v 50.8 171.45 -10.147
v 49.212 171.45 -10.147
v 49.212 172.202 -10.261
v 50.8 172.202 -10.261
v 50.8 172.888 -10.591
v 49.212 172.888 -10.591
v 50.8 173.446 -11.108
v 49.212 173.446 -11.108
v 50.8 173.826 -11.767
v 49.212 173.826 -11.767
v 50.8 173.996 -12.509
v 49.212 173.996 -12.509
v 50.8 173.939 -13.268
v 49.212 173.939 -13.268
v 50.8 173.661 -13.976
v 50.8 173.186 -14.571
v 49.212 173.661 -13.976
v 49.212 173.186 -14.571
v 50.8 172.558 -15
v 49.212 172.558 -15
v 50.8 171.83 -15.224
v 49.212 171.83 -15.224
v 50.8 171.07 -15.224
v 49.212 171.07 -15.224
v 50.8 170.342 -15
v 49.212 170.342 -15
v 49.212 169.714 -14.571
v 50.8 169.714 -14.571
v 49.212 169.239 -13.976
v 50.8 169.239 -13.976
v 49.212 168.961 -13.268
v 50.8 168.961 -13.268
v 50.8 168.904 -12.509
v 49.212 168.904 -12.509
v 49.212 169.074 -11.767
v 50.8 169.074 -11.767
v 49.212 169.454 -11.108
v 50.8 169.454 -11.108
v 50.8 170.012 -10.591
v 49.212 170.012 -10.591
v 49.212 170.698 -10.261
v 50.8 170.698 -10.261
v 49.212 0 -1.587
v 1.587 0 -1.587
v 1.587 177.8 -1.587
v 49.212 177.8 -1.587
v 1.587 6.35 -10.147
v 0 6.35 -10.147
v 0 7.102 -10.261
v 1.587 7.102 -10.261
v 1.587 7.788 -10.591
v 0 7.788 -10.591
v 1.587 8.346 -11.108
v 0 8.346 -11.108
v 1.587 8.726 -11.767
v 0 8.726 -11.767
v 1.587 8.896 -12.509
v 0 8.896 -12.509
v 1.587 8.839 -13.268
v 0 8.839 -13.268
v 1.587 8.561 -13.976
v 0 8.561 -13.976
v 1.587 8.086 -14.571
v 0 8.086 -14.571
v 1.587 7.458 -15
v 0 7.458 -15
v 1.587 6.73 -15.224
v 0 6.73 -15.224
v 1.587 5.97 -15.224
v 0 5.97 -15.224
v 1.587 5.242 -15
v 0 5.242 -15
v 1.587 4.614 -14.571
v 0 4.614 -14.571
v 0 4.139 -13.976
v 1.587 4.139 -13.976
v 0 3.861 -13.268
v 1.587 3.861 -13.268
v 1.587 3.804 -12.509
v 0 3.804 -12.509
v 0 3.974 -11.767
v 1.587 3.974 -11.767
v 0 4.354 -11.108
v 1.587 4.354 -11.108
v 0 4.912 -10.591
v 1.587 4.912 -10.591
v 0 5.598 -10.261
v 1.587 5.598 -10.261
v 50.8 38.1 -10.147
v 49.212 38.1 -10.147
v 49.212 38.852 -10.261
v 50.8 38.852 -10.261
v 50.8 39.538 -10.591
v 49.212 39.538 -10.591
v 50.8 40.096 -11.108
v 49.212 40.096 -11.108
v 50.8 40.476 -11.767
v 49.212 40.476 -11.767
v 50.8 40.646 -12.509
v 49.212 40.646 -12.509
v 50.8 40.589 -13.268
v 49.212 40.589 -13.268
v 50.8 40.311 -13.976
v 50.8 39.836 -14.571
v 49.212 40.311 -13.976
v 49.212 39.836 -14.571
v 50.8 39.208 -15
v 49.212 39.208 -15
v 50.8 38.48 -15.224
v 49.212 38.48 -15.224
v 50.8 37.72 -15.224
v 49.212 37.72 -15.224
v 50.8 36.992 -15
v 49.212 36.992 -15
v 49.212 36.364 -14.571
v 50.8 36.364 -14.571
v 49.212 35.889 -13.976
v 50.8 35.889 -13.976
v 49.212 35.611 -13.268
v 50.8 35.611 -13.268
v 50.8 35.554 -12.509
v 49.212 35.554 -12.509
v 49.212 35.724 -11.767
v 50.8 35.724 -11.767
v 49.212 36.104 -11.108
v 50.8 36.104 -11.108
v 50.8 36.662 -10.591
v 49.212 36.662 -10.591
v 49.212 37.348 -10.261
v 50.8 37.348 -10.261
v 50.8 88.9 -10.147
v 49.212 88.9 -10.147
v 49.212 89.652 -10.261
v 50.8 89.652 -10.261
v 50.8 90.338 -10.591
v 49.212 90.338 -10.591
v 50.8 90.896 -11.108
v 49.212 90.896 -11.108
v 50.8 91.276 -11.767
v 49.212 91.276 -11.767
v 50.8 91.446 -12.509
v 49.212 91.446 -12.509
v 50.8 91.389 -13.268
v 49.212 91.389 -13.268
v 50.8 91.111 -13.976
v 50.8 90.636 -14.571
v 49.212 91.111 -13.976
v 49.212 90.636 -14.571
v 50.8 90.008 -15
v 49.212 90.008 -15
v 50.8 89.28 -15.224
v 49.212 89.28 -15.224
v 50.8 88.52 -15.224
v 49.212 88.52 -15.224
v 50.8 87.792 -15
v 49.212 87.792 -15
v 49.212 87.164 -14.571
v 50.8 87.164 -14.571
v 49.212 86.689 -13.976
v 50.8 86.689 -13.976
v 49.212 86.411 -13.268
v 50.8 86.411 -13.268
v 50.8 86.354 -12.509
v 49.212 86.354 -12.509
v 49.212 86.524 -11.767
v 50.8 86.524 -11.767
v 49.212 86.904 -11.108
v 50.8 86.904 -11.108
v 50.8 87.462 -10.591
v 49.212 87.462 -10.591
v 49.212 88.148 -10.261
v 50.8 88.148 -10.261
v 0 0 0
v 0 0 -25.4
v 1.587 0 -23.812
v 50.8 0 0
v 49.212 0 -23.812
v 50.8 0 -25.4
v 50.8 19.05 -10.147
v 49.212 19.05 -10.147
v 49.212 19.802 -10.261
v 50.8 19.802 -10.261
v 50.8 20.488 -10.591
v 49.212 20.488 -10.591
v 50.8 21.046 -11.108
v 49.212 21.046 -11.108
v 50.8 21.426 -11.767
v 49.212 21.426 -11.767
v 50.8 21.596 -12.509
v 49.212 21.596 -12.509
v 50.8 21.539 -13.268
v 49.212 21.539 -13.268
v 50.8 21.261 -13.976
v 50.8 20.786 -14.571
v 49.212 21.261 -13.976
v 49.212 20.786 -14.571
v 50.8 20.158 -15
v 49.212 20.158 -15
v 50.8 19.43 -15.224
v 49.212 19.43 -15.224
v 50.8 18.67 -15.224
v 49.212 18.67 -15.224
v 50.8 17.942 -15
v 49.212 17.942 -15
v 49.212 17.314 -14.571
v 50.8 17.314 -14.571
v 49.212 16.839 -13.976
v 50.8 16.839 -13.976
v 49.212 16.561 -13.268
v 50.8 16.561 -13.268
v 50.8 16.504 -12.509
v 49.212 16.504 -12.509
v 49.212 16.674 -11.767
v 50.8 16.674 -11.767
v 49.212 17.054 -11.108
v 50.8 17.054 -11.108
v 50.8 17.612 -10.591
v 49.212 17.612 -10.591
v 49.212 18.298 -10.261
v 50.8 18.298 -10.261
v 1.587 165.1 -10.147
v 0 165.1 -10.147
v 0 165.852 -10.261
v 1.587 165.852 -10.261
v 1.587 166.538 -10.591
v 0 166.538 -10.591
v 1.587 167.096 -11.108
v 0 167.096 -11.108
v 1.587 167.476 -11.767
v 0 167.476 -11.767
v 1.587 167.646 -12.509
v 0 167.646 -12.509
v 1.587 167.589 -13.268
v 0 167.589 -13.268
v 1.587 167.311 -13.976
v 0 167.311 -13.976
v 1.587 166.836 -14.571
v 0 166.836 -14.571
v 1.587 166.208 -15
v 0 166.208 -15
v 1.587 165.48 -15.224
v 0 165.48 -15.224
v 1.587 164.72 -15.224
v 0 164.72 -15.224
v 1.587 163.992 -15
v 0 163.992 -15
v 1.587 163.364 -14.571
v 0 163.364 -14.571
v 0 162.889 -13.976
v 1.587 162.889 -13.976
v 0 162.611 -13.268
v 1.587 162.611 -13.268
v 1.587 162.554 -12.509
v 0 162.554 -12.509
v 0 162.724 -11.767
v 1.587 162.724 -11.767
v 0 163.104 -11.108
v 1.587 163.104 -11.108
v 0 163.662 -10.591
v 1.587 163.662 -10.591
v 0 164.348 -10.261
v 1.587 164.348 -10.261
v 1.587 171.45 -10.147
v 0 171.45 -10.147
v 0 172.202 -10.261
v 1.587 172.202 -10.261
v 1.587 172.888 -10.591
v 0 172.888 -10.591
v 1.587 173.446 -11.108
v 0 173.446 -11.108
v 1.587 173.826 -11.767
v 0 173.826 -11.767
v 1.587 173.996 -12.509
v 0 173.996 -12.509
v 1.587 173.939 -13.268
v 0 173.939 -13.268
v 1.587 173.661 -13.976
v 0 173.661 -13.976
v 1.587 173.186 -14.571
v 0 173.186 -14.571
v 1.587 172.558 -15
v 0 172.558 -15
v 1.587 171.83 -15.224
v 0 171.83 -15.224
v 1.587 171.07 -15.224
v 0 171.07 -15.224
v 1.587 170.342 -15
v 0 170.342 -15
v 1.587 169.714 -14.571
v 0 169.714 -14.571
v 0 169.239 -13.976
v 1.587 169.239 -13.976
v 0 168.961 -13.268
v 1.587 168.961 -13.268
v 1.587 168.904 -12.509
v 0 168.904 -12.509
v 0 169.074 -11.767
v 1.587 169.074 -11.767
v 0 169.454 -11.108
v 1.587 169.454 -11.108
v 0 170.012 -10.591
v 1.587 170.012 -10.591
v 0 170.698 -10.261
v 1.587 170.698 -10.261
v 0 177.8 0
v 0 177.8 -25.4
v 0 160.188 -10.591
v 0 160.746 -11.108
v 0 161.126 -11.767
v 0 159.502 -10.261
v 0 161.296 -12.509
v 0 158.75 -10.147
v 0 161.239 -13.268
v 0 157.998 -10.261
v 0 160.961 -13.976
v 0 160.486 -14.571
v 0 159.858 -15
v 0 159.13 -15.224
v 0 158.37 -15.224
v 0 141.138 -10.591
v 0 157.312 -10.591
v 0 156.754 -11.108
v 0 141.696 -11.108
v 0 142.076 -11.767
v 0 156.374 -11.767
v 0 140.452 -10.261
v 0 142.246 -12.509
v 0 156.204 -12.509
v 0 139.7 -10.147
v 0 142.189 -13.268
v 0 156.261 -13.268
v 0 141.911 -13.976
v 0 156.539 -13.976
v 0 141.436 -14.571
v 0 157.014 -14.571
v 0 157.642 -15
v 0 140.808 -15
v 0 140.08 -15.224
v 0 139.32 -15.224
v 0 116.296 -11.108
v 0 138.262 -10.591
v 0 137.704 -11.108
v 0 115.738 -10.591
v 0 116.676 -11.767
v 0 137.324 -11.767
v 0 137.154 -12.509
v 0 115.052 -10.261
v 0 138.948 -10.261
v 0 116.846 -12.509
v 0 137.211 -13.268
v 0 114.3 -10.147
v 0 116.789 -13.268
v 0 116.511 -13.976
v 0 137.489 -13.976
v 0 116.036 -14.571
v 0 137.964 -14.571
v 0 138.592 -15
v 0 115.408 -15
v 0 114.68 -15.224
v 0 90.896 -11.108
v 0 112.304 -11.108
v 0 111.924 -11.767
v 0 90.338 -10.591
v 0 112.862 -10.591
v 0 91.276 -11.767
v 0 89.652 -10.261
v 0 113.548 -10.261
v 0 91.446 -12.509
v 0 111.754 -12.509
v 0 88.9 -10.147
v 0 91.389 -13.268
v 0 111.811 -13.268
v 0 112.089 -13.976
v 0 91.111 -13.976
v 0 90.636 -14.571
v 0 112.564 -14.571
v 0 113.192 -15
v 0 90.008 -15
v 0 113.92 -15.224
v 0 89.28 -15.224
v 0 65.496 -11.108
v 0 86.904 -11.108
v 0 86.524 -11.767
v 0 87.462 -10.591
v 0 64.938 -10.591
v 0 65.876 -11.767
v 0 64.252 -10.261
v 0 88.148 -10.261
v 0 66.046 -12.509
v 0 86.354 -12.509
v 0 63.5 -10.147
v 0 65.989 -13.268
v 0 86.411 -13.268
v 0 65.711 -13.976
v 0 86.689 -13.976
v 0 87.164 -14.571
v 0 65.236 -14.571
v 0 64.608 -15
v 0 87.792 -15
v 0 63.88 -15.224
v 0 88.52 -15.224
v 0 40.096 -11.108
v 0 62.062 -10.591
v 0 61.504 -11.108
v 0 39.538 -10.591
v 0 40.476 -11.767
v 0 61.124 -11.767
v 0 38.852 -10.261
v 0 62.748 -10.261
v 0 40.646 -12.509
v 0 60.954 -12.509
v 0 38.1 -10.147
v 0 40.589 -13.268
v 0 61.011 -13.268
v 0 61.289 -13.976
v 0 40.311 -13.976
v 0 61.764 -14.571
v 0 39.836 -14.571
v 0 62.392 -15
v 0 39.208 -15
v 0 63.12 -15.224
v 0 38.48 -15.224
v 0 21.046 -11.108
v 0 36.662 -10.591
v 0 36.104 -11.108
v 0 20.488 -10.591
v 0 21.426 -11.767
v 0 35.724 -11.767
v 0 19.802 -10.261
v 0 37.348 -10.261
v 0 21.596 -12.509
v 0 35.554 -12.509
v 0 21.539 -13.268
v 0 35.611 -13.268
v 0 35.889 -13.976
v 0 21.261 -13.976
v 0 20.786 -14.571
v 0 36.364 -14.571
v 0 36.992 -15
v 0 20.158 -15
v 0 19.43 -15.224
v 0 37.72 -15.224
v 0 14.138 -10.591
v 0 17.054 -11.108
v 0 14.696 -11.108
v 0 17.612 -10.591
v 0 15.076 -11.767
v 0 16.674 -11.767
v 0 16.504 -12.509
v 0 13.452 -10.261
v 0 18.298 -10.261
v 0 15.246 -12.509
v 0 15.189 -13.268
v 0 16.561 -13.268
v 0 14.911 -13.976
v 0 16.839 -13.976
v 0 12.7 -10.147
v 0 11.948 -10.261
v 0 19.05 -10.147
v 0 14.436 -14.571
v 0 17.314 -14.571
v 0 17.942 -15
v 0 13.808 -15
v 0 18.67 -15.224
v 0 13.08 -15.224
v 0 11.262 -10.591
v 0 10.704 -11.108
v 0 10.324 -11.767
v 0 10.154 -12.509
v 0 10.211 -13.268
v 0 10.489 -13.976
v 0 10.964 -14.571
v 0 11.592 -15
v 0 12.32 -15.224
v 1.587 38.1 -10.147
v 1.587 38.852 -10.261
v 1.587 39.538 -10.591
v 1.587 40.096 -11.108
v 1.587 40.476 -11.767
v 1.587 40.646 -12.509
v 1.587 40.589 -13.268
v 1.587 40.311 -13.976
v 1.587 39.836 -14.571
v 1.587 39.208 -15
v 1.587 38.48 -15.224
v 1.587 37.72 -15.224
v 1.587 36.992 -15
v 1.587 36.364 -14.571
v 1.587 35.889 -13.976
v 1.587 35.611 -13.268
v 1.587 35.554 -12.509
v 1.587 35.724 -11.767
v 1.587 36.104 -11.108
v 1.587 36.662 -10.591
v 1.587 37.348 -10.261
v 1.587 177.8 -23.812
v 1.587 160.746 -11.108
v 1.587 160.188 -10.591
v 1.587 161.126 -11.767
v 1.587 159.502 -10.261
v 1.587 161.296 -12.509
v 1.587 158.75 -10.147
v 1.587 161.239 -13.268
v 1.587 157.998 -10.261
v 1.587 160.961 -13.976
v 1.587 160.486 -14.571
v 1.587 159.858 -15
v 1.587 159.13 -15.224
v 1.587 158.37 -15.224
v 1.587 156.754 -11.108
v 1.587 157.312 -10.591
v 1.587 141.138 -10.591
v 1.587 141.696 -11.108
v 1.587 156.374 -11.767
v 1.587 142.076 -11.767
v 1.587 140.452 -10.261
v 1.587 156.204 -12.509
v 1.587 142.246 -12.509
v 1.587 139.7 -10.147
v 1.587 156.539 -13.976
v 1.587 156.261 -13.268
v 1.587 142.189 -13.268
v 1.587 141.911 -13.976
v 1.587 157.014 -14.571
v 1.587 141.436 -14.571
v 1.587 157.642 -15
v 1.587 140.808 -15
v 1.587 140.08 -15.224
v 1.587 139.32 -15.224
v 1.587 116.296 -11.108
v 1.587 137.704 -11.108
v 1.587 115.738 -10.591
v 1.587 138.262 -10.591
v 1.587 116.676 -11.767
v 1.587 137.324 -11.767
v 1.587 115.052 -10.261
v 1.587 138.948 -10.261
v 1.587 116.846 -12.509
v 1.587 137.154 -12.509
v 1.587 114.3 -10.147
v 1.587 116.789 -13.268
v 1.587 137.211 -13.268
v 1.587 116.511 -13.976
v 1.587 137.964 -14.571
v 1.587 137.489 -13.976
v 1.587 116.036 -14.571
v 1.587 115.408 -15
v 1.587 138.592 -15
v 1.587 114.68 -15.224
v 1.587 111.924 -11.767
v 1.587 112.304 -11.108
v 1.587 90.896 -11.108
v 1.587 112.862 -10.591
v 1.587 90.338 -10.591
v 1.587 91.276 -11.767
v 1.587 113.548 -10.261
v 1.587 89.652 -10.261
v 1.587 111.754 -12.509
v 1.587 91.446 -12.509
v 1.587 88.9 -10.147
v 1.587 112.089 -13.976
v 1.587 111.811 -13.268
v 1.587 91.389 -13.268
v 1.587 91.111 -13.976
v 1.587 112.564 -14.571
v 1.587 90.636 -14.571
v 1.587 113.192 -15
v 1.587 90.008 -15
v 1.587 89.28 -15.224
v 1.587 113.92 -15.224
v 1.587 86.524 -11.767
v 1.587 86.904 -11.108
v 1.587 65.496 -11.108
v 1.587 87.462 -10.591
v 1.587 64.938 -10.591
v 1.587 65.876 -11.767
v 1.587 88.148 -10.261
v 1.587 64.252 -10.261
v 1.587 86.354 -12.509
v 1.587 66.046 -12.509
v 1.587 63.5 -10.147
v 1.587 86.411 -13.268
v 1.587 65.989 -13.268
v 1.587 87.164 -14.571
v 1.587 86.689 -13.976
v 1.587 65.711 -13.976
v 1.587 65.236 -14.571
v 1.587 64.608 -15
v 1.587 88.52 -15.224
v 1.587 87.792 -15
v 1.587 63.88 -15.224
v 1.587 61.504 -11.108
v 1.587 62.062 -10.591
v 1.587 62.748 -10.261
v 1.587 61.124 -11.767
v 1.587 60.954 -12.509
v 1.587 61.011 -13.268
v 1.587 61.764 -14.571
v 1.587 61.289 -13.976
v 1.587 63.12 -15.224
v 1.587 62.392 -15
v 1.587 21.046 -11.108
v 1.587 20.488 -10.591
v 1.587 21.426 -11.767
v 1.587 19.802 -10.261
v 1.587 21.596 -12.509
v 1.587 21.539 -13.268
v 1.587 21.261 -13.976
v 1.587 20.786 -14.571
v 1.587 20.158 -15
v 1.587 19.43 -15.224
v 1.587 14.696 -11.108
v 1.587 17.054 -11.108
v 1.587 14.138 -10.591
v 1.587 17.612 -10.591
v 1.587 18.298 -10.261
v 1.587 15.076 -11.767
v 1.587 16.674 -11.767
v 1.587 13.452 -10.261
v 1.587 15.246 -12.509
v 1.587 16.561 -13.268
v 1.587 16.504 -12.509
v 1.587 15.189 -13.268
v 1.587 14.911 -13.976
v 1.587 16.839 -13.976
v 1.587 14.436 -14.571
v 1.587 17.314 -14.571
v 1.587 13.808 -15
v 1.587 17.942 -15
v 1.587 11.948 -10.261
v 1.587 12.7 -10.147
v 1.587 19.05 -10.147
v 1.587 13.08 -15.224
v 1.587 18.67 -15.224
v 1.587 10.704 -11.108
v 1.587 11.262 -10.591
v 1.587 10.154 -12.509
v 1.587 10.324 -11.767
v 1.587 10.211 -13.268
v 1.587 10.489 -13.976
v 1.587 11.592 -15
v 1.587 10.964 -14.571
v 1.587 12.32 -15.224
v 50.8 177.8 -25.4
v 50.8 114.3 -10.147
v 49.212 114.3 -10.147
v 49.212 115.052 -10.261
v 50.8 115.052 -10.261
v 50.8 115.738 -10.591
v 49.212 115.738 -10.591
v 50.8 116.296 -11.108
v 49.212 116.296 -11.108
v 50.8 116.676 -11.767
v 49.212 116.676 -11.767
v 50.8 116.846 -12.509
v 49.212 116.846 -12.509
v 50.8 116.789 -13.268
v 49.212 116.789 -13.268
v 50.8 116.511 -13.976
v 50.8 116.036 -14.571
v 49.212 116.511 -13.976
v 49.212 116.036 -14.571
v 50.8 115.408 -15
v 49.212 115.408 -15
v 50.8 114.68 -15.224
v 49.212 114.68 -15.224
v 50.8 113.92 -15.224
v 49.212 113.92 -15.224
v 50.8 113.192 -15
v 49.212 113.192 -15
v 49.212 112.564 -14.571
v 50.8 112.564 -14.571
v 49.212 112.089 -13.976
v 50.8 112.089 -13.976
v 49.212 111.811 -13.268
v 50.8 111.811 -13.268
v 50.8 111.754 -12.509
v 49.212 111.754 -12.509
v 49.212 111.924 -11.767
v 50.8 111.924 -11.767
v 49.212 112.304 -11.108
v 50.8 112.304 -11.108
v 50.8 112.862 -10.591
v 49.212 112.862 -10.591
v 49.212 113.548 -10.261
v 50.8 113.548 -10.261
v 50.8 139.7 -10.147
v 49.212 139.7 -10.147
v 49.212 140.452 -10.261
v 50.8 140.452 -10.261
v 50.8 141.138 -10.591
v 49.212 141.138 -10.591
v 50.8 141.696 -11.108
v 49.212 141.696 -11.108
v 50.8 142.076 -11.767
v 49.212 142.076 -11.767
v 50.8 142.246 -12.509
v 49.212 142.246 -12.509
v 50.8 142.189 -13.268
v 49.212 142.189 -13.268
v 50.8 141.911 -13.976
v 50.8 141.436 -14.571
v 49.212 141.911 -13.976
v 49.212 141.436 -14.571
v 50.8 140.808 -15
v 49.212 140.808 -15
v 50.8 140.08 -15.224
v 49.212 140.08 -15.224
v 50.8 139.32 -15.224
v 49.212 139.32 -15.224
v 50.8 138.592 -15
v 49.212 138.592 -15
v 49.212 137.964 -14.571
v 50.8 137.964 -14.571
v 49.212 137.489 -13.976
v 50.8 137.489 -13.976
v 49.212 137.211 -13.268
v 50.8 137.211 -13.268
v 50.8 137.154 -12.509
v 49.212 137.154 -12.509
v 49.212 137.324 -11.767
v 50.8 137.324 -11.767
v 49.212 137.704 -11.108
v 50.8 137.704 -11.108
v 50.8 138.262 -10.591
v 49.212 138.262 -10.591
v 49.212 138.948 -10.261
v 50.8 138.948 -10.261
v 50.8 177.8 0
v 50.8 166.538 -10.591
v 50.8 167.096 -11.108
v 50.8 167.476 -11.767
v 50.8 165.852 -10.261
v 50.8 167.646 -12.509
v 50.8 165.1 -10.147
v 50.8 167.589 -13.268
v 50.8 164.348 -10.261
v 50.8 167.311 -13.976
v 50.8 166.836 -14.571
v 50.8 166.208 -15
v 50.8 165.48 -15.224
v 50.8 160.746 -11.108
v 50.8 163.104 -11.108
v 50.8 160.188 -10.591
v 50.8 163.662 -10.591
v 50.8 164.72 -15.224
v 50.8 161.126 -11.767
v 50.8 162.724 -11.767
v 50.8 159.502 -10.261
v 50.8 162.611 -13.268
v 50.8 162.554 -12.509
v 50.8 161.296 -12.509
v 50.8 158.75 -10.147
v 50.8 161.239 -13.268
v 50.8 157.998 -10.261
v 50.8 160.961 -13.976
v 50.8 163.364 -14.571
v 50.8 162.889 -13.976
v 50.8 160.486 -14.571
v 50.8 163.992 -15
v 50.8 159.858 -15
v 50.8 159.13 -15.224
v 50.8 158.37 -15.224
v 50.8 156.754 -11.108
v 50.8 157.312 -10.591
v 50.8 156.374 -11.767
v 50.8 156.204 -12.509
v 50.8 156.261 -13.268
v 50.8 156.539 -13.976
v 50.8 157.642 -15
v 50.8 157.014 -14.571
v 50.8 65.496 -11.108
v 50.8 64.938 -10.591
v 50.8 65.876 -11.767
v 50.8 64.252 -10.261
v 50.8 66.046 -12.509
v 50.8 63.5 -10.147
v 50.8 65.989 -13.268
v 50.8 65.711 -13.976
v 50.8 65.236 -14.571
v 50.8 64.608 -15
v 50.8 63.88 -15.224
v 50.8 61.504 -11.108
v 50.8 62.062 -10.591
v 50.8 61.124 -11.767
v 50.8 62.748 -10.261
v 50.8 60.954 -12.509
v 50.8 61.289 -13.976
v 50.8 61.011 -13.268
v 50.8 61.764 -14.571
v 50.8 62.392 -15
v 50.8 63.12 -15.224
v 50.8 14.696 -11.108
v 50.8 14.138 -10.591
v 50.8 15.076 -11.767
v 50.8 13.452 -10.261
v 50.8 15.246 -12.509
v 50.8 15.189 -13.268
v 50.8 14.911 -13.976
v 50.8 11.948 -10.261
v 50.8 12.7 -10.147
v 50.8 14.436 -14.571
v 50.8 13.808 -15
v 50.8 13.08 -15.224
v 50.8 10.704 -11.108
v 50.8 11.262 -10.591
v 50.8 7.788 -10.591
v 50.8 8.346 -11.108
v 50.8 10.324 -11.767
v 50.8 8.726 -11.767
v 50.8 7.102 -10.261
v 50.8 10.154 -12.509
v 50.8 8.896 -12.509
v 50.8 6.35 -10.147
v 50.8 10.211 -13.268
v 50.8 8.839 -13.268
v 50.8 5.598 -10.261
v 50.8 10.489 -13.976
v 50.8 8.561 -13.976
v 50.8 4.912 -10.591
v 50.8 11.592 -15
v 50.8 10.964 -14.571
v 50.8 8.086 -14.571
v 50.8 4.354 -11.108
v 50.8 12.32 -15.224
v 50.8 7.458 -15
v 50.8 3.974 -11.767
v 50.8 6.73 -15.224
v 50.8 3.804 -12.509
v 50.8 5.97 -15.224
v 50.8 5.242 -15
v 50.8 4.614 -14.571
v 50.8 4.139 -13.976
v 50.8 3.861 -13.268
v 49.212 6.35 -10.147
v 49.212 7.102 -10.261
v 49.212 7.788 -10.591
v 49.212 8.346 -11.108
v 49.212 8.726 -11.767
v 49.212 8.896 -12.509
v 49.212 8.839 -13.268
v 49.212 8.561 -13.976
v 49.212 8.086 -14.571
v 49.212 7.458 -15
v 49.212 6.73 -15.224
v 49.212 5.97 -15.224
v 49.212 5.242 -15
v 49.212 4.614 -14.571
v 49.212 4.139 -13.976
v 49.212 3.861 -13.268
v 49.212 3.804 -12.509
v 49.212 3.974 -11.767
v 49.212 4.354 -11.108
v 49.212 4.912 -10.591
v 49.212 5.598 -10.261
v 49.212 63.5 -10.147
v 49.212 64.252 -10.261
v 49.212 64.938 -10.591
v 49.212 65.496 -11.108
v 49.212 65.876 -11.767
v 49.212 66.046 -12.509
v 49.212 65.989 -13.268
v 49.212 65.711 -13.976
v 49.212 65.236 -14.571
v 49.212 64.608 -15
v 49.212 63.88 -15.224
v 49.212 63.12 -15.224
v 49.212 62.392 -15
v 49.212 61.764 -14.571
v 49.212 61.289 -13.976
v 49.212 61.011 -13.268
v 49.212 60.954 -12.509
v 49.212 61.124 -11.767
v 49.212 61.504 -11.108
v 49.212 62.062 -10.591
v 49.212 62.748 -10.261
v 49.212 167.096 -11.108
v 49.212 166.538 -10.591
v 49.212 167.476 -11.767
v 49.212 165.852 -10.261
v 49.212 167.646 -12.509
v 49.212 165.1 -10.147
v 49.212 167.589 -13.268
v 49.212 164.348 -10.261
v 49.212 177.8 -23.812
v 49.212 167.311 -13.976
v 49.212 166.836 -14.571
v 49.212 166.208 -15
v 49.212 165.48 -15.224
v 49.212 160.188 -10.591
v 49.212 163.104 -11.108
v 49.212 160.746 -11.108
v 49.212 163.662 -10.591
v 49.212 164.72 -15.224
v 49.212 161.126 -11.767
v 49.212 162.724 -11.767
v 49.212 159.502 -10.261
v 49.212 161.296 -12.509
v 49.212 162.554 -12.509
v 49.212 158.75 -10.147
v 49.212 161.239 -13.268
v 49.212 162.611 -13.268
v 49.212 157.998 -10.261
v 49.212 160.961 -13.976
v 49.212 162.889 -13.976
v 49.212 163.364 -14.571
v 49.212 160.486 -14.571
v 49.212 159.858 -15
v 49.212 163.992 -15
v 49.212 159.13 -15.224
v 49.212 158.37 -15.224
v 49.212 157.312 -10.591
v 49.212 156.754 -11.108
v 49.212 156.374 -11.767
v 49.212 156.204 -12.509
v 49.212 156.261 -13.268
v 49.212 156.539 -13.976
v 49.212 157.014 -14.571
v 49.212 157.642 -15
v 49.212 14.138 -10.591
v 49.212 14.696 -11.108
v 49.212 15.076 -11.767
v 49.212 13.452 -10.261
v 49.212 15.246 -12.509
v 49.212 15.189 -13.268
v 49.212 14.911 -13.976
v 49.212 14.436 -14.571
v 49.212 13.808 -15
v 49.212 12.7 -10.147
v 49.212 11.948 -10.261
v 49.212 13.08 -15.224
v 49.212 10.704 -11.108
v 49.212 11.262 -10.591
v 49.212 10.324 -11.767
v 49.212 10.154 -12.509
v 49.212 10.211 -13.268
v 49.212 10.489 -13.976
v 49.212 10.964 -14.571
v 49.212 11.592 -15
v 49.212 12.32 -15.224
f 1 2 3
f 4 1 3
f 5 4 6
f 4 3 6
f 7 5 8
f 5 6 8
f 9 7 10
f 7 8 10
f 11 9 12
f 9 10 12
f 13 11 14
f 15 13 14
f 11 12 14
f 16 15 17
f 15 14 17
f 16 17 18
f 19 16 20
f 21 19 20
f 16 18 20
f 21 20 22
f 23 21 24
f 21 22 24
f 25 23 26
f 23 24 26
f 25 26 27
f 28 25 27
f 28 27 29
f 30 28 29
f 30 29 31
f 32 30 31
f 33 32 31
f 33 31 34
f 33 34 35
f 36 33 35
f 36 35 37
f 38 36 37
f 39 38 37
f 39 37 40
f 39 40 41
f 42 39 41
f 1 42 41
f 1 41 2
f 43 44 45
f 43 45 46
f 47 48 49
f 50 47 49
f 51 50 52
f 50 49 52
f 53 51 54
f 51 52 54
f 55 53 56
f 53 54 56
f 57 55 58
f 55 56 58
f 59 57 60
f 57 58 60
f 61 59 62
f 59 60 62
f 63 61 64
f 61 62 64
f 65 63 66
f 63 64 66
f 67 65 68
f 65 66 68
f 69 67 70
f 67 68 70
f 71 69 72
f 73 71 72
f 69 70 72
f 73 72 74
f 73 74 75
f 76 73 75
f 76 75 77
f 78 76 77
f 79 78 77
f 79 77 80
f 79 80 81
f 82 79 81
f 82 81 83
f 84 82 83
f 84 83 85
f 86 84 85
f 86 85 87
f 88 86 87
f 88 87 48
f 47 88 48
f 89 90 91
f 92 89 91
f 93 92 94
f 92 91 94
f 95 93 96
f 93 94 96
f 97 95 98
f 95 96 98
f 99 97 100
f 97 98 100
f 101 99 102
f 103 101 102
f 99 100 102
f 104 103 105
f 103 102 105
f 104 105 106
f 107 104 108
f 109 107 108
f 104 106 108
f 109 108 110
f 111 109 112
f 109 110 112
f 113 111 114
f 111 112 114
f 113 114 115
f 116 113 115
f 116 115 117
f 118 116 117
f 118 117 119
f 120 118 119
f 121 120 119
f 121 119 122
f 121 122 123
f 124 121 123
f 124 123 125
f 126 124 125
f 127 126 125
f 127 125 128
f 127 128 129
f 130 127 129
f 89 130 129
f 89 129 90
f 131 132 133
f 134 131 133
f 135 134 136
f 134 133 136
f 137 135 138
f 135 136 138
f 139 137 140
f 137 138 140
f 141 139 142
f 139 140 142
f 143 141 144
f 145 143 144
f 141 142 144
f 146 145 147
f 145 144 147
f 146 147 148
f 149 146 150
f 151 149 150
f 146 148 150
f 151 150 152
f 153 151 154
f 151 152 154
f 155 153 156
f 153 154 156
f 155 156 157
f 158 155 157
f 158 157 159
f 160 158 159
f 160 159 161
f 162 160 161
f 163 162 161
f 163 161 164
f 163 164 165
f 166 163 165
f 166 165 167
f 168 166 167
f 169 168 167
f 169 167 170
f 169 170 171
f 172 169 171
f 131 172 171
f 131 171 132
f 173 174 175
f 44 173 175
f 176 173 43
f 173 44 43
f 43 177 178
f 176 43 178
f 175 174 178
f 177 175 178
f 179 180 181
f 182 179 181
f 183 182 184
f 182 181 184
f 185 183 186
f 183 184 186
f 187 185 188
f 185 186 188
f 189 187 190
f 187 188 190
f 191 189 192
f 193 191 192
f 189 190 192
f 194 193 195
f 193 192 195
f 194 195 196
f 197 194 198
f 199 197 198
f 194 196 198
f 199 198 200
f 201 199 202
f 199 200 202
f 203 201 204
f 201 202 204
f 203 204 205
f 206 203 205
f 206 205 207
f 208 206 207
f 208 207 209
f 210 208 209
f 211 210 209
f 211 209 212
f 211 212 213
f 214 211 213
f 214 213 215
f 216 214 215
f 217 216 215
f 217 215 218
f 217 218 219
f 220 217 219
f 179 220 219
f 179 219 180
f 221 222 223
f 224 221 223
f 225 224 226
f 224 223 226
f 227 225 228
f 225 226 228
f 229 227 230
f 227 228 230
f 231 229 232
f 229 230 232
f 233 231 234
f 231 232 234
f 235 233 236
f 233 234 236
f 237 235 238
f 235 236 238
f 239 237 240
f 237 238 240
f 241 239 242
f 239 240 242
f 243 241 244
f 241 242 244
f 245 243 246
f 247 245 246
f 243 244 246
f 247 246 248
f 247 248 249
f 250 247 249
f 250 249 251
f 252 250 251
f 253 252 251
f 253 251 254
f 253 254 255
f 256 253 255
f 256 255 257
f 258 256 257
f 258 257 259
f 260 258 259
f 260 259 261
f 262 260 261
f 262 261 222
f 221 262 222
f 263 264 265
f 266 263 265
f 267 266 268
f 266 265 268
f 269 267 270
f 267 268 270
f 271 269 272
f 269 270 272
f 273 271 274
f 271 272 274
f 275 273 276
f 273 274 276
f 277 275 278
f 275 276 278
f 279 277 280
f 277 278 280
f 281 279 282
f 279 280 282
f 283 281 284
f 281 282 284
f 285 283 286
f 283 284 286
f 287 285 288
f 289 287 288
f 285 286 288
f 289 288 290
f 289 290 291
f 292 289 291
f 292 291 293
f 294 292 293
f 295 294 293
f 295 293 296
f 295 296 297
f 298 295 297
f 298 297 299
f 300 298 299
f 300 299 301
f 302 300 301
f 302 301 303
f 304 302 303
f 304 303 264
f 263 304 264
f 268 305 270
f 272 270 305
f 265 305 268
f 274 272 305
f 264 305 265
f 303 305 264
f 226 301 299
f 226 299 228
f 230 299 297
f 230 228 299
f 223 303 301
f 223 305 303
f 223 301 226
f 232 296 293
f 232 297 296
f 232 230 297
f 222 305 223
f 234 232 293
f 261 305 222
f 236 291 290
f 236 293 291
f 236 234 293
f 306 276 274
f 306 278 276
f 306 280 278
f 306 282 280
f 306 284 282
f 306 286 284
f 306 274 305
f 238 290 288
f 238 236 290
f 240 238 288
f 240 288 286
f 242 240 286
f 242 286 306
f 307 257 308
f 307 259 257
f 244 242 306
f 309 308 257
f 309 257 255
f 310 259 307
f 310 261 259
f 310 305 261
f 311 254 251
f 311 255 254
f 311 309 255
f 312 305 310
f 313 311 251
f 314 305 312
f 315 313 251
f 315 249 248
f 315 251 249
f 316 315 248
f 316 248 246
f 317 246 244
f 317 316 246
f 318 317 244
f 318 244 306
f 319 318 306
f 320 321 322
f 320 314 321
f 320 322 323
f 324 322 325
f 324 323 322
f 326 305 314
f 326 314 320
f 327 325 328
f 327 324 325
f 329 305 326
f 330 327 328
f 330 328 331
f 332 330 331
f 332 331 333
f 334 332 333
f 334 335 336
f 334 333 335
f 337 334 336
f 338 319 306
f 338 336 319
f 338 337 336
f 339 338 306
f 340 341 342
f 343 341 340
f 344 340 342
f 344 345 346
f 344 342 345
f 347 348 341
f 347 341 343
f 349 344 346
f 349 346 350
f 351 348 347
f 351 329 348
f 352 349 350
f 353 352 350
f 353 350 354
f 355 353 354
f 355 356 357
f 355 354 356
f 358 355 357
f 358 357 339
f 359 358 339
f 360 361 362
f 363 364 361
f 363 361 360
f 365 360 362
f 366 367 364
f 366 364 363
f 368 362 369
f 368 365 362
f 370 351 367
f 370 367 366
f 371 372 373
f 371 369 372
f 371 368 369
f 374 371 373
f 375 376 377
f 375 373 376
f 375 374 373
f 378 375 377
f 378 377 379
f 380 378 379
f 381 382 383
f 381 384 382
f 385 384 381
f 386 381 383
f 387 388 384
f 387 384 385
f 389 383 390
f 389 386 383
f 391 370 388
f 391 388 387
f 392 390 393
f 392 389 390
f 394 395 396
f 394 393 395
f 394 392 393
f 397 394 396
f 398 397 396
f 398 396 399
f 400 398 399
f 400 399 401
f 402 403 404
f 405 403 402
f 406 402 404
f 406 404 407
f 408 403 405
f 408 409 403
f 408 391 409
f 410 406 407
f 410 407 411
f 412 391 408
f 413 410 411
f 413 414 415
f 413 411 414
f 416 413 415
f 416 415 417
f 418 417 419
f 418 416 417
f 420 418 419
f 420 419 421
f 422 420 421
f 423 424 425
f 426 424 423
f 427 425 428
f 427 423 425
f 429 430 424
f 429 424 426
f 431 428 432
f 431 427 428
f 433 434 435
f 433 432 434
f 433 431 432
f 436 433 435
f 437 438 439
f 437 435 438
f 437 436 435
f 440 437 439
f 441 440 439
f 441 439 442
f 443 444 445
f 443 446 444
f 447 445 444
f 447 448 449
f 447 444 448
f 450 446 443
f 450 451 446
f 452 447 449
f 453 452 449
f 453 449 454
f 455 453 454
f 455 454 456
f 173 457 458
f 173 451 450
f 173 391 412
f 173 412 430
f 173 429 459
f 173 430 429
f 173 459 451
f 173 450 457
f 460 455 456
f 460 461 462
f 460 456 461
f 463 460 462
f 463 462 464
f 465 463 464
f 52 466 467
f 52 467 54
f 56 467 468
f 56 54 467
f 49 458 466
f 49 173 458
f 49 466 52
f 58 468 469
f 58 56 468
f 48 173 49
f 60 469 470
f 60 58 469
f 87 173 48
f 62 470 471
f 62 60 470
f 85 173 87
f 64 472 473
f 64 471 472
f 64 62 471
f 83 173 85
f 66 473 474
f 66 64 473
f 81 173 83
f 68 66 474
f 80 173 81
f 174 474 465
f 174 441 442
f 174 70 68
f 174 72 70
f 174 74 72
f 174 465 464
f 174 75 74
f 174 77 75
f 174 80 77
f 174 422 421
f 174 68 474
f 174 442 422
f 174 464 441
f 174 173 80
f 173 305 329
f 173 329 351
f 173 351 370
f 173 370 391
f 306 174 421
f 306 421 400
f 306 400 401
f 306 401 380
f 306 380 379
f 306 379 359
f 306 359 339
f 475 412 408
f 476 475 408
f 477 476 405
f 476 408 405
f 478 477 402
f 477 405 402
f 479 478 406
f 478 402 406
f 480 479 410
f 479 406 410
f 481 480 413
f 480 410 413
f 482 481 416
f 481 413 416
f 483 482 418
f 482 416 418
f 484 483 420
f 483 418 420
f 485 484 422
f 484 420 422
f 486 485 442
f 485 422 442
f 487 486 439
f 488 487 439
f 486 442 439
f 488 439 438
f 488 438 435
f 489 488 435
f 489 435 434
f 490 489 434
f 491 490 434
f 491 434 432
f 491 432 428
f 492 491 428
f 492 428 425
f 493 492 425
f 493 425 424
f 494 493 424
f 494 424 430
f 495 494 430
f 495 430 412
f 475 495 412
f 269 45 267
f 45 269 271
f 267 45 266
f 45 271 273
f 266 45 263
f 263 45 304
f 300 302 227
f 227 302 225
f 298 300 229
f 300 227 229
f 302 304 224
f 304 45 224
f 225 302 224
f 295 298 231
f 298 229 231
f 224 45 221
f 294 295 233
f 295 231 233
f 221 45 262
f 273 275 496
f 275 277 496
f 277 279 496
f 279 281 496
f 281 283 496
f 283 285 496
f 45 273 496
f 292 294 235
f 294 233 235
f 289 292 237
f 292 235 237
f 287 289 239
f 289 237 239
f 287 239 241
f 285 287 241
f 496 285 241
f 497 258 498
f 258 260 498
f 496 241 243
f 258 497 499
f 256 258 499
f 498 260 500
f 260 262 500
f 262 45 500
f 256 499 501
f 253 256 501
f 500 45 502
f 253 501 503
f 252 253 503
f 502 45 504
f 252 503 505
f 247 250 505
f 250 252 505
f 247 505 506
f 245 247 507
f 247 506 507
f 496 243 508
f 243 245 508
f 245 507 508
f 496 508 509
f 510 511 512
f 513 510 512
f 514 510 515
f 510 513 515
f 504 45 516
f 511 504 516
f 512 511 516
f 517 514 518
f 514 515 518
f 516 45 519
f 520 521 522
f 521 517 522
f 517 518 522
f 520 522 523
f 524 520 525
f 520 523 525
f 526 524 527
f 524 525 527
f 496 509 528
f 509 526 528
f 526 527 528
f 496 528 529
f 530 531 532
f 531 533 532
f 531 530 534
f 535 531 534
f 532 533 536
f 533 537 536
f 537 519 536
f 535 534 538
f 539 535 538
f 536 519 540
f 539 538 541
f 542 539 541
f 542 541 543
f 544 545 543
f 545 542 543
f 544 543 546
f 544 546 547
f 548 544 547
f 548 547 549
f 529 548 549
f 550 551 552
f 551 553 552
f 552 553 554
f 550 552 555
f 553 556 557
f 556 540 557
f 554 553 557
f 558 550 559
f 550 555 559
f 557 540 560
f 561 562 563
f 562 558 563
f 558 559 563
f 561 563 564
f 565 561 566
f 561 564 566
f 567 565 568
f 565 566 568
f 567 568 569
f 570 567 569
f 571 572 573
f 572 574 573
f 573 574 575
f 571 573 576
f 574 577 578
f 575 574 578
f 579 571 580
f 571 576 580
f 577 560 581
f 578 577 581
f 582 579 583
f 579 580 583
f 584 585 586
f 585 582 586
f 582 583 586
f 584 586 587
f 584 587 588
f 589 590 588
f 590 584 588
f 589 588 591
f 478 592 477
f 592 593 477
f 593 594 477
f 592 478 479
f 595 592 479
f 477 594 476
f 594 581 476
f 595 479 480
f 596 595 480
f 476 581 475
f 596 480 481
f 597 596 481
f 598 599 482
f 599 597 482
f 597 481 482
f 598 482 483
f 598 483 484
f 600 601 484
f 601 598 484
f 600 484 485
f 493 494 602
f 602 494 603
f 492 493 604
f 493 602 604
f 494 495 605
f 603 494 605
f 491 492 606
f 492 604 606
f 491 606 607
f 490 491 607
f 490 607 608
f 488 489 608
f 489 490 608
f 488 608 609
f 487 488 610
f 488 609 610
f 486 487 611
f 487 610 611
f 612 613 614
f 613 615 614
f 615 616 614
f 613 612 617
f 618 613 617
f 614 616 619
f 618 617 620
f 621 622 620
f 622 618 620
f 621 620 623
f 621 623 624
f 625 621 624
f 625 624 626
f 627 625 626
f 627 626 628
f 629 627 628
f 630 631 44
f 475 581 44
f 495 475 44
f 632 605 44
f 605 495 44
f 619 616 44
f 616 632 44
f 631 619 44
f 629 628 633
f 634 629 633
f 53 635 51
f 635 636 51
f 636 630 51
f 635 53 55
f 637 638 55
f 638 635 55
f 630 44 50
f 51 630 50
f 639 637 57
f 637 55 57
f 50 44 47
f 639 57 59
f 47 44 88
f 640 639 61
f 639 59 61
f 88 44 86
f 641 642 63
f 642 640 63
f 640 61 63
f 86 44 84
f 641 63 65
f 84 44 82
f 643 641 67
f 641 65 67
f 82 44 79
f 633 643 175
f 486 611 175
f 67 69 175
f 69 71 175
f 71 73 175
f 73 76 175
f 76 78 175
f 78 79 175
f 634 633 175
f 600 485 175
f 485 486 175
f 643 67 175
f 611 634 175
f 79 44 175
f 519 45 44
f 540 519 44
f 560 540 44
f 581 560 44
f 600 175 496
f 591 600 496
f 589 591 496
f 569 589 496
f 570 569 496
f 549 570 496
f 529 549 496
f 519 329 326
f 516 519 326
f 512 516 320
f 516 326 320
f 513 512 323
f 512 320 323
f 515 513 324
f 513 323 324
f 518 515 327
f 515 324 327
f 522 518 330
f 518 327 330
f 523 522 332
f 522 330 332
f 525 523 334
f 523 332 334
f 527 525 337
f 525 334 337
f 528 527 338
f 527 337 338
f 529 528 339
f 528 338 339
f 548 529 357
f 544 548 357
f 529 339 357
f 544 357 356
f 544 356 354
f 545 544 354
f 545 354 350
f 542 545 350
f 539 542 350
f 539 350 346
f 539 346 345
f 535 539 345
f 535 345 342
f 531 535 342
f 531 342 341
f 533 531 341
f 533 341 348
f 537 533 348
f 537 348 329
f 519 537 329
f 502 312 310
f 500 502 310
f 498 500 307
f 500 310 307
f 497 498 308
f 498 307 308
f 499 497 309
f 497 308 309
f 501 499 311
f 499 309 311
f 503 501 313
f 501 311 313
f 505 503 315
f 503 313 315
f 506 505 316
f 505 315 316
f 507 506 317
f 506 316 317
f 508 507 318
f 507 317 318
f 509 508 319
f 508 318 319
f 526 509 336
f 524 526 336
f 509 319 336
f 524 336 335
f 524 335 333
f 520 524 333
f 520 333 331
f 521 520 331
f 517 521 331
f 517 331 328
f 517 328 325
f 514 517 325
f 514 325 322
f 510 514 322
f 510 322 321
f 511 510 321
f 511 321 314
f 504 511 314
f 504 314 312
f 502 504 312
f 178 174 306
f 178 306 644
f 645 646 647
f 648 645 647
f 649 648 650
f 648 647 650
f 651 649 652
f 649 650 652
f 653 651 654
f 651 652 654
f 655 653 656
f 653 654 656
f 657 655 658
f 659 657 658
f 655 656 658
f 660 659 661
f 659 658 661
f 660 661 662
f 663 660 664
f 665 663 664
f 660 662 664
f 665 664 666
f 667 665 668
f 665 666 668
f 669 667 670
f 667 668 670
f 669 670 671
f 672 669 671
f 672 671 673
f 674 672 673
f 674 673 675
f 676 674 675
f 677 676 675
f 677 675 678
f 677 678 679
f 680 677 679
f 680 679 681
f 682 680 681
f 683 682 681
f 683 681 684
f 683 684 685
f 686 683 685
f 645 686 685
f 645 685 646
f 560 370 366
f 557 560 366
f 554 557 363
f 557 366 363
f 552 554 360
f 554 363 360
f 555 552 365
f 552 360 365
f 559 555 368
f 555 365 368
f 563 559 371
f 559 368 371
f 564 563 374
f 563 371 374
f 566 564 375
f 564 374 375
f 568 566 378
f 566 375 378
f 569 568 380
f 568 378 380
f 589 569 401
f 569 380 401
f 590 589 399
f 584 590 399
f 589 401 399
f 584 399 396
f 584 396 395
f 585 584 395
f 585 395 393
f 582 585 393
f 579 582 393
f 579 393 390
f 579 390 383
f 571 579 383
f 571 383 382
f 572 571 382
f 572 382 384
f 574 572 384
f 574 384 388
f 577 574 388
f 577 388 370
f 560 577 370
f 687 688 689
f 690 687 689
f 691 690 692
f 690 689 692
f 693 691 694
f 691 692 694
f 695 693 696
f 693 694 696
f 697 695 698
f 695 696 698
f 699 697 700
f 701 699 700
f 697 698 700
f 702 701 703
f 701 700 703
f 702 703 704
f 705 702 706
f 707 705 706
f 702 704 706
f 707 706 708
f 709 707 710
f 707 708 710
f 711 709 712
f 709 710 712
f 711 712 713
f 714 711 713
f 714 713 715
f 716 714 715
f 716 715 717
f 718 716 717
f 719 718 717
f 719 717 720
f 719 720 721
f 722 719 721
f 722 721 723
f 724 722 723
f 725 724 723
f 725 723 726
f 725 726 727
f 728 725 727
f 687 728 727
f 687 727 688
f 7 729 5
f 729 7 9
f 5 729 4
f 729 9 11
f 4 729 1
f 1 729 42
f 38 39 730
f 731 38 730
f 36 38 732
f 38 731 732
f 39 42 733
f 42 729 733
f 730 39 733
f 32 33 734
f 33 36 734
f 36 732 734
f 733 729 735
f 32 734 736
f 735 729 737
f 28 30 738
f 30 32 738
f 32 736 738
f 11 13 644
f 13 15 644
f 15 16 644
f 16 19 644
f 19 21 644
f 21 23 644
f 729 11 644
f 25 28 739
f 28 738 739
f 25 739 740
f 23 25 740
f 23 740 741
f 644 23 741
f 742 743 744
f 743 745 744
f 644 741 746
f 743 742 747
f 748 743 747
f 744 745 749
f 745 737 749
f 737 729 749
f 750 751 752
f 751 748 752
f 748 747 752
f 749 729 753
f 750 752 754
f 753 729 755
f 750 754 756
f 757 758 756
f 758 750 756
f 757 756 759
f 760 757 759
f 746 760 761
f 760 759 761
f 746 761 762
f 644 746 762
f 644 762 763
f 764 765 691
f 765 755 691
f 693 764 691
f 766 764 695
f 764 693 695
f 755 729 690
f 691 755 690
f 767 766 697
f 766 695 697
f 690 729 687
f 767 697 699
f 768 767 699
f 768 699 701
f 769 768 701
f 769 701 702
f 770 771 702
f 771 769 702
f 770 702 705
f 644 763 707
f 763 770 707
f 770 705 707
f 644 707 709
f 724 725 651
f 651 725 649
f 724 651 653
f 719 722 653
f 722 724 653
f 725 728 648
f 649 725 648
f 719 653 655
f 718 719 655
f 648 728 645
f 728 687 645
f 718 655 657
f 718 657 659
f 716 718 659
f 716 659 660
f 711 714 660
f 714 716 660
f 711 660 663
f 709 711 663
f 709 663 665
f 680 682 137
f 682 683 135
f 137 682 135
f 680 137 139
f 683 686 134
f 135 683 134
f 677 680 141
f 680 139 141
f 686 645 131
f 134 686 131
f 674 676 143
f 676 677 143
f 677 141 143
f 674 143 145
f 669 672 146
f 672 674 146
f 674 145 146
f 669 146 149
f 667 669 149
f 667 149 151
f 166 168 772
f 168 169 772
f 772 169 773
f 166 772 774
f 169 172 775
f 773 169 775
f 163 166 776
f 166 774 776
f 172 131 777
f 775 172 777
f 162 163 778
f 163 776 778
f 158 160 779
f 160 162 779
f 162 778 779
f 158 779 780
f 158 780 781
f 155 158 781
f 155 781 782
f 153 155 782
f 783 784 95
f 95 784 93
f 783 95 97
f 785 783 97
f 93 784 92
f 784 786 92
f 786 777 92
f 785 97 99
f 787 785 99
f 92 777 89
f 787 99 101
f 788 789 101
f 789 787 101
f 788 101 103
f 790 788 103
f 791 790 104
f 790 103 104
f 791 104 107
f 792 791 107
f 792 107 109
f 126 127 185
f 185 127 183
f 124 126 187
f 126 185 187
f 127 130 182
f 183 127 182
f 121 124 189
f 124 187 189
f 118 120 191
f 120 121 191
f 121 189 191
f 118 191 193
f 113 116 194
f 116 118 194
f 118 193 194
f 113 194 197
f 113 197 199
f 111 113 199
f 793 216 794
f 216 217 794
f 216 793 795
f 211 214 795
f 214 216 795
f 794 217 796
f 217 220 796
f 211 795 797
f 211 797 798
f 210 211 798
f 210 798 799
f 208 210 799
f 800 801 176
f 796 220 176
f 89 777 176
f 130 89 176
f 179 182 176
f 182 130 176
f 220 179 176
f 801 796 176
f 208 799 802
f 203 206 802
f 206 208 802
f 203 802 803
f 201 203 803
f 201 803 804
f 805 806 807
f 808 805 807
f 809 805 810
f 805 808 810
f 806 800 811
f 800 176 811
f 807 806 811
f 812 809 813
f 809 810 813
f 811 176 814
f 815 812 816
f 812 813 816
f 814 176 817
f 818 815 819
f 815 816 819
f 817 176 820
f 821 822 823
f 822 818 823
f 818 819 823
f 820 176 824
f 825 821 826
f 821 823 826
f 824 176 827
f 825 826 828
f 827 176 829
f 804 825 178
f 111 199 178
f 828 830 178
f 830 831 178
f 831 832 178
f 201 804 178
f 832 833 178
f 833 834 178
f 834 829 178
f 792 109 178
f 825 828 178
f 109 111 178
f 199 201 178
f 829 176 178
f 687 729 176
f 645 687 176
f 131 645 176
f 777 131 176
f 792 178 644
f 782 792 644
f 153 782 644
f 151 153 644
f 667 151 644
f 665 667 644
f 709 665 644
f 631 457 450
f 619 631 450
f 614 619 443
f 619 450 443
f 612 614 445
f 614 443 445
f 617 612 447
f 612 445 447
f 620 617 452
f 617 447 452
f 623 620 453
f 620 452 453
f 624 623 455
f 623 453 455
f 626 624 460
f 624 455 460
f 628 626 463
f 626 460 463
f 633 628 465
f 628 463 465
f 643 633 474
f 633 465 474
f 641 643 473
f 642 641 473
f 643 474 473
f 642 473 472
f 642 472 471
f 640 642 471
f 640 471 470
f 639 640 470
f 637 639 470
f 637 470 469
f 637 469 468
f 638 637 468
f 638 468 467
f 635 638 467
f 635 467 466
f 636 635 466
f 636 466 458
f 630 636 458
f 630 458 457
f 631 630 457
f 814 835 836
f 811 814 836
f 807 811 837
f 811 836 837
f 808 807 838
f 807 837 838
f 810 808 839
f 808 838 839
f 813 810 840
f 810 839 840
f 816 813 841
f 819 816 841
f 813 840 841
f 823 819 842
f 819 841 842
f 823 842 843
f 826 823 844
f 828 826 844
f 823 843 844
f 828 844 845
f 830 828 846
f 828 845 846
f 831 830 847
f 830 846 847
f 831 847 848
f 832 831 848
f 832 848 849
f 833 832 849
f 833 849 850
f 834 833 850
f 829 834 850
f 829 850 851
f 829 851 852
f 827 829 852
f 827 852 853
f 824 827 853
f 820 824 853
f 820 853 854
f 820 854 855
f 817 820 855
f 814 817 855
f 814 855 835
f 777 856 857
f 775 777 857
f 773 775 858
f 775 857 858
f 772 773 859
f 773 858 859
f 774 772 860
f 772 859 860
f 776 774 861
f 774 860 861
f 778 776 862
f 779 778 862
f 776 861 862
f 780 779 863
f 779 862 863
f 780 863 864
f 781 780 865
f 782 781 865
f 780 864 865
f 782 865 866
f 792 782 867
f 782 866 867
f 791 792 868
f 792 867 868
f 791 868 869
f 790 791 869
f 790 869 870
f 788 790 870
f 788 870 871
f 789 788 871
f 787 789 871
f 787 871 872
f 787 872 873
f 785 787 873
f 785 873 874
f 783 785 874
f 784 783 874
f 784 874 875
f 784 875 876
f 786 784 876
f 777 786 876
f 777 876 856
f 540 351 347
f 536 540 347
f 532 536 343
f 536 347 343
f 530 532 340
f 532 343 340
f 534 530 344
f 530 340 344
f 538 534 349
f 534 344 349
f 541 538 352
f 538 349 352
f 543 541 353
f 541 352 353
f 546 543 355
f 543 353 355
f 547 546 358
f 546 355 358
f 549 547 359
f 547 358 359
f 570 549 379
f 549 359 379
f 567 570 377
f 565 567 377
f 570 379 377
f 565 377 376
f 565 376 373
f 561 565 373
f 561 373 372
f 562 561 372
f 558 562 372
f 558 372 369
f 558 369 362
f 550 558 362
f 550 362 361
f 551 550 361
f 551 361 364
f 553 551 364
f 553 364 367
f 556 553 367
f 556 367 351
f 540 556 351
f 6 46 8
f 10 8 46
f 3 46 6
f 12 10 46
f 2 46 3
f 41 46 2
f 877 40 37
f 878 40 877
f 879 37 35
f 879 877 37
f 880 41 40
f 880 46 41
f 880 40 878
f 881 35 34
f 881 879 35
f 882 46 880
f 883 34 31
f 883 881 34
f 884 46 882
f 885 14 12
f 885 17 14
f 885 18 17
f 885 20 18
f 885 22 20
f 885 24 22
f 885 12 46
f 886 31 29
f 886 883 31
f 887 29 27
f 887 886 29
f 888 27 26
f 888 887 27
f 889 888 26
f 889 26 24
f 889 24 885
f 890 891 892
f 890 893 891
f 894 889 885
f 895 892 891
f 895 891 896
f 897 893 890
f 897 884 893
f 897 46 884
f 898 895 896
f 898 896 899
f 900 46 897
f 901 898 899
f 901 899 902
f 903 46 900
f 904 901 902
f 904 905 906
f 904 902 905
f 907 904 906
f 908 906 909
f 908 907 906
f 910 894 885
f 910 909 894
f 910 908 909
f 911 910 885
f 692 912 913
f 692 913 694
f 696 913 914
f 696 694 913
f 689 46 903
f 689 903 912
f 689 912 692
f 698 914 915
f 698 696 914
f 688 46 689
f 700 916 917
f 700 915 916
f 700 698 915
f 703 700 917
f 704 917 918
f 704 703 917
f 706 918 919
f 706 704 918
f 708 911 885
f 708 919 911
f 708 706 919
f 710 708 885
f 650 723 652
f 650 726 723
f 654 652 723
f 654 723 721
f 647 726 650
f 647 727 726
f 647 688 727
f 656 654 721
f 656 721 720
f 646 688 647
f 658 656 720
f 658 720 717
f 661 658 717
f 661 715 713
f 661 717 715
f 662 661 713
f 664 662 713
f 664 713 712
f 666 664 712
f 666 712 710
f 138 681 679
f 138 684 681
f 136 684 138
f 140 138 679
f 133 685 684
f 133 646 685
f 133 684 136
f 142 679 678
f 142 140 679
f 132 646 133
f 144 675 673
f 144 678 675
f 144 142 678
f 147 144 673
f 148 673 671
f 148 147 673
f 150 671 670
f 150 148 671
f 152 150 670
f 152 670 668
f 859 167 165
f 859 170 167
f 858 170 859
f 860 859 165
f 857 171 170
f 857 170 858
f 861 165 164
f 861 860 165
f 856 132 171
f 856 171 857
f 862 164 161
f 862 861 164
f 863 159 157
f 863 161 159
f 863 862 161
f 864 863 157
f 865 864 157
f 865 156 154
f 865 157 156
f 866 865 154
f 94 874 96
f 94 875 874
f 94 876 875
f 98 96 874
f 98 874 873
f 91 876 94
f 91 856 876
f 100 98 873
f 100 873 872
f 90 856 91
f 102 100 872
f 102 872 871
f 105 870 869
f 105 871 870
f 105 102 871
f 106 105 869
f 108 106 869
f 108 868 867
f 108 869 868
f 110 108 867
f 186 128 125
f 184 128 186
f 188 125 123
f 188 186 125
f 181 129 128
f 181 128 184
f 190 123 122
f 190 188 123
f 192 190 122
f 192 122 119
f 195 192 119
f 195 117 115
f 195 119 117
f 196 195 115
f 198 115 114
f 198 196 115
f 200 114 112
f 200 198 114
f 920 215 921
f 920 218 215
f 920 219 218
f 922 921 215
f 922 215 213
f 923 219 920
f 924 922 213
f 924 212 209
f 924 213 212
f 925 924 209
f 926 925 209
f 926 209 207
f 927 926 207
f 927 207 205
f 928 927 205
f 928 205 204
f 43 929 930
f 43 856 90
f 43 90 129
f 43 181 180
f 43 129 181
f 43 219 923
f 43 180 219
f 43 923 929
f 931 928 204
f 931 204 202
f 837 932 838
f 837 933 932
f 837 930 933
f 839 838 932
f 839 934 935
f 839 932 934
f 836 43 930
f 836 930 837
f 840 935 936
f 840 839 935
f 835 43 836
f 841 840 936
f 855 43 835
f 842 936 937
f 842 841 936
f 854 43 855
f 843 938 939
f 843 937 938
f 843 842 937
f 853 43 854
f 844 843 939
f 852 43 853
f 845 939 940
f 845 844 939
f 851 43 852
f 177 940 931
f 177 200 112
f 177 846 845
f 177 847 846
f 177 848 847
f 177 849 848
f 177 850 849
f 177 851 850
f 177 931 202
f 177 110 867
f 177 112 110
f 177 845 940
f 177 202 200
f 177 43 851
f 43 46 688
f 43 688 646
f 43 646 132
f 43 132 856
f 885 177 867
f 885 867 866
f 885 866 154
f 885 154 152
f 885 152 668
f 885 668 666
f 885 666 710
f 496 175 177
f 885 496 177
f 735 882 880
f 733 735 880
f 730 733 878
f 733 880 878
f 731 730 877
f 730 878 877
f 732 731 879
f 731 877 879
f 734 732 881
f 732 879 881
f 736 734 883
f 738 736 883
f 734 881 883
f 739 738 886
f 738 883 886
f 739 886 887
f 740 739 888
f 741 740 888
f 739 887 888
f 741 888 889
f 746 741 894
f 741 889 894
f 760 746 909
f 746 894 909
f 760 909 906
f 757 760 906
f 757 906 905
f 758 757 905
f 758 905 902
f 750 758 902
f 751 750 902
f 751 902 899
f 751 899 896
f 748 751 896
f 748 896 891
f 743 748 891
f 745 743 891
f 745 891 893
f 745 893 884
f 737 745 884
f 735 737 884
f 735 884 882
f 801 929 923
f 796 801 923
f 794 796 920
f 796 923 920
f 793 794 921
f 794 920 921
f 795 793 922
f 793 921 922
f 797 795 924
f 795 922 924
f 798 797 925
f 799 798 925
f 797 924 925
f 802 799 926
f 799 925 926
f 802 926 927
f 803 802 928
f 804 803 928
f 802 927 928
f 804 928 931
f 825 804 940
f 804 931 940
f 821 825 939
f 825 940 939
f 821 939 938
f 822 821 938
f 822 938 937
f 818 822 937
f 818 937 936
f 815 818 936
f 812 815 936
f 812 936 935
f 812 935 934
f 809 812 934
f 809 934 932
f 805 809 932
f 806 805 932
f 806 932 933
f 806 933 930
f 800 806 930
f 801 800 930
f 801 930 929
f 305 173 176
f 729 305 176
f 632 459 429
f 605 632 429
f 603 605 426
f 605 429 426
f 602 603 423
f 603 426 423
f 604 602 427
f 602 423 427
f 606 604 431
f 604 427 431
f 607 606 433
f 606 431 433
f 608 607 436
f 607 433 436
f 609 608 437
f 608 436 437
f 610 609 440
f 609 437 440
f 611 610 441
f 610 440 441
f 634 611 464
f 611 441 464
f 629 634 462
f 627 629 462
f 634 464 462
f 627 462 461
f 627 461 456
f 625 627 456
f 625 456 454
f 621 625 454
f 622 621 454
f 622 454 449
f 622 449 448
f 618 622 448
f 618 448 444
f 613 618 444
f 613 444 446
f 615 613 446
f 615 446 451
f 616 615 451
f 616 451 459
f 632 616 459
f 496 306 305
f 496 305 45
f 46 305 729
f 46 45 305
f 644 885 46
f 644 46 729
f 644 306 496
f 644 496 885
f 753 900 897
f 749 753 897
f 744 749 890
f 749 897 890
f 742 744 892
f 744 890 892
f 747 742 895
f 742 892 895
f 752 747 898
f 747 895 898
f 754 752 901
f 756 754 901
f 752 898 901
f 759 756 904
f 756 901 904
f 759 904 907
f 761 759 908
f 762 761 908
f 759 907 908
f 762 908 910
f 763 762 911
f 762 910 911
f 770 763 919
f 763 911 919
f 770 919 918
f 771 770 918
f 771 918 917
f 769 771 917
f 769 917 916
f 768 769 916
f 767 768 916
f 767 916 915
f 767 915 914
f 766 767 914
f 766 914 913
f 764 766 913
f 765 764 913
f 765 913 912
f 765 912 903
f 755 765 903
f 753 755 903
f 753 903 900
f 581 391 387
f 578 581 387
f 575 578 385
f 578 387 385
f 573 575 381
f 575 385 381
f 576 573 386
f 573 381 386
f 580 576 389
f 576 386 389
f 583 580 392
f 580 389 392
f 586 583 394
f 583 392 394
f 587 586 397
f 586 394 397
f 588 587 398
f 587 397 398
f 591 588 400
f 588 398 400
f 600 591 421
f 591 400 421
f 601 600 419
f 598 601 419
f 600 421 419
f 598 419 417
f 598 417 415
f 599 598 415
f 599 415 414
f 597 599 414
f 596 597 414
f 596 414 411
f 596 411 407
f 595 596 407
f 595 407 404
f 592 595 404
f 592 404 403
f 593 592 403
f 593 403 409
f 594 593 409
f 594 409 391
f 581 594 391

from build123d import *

# Parameters (mm, degrees)
SKETCH2_W           = 50.8
SKETCH2_H           = 25.4
SKETCH2_W_2         = 47.625
SKETCH2_H_2         = 22.225
BOSS_EXTRUDE2_DEPTH = 177.8
SKETCH4_R           = 2.5527
CUT_EXTRUDE2_DEPTH  = 50.8
LPATTERN1_COUNT     = 27
LPATTERN1_PITCH     = 6.35
SKETCH5_R           = 2.5527
CUT_EXTRUDE3_DEPTH  = 50.8
LPATTERN2_COUNT     = 5
LPATTERN2_PITCH     = 25.4


with BuildPart() as part:
    # Sketch2 → Boss-Extrude2 (new body)
    with BuildSketch(Plane(origin=(0, 0, 0), x_dir=(1, 0, 0), z_dir=(0, 1, 0))):
        with Locations((25.4, 12.7)):
            Rectangle(SKETCH2_W, SKETCH2_H)
        with Locations((25.4, 12.7)):
            Rectangle(SKETCH2_W_2, SKETCH2_H_2, mode=Mode.SUBTRACT)
    extrude(amount=BOSS_EXTRUDE2_DEPTH)

    # Sketch4 → Cut-Extrude2 (cut)
    with BuildSketch(Plane.ZY):
        with Locations((-12.7, 171.45)):
            Circle(SKETCH4_R)
    cut_extrude2 = extrude(amount=-CUT_EXTRUDE2_DEPTH, mode=Mode.SUBTRACT)

    # LPattern1: Cut-Extrude2 ×27, 21 skipped
    with Locations(*[(0, -i * LPATTERN1_PITCH, 0) for i in range(1, LPATTERN1_COUNT) if i not in (3, 4, 5, 6, 7, 8, 9, 10, 11, 12, 13, 14, 15, 16, 17, 18, 19, 20, 21, 22, 23)]):
        add(cut_extrude2, mode=Mode.SUBTRACT)

    # Sketch5 → Cut-Extrude3 (cut)
    with BuildSketch(Plane.ZY):
        with Locations((-12.7, 139.7)):
            Circle(SKETCH5_R)
    cut_extrude3 = extrude(amount=-CUT_EXTRUDE3_DEPTH, mode=Mode.SUBTRACT)

    # LPattern2: Cut-Extrude3 ×5
    with Locations(*[(0, -i * LPATTERN2_PITCH, 0) for i in range(1, LPATTERN2_COUNT)]):
        add(cut_extrude3, mode=Mode.SUBTRACT)


solid = part.part
